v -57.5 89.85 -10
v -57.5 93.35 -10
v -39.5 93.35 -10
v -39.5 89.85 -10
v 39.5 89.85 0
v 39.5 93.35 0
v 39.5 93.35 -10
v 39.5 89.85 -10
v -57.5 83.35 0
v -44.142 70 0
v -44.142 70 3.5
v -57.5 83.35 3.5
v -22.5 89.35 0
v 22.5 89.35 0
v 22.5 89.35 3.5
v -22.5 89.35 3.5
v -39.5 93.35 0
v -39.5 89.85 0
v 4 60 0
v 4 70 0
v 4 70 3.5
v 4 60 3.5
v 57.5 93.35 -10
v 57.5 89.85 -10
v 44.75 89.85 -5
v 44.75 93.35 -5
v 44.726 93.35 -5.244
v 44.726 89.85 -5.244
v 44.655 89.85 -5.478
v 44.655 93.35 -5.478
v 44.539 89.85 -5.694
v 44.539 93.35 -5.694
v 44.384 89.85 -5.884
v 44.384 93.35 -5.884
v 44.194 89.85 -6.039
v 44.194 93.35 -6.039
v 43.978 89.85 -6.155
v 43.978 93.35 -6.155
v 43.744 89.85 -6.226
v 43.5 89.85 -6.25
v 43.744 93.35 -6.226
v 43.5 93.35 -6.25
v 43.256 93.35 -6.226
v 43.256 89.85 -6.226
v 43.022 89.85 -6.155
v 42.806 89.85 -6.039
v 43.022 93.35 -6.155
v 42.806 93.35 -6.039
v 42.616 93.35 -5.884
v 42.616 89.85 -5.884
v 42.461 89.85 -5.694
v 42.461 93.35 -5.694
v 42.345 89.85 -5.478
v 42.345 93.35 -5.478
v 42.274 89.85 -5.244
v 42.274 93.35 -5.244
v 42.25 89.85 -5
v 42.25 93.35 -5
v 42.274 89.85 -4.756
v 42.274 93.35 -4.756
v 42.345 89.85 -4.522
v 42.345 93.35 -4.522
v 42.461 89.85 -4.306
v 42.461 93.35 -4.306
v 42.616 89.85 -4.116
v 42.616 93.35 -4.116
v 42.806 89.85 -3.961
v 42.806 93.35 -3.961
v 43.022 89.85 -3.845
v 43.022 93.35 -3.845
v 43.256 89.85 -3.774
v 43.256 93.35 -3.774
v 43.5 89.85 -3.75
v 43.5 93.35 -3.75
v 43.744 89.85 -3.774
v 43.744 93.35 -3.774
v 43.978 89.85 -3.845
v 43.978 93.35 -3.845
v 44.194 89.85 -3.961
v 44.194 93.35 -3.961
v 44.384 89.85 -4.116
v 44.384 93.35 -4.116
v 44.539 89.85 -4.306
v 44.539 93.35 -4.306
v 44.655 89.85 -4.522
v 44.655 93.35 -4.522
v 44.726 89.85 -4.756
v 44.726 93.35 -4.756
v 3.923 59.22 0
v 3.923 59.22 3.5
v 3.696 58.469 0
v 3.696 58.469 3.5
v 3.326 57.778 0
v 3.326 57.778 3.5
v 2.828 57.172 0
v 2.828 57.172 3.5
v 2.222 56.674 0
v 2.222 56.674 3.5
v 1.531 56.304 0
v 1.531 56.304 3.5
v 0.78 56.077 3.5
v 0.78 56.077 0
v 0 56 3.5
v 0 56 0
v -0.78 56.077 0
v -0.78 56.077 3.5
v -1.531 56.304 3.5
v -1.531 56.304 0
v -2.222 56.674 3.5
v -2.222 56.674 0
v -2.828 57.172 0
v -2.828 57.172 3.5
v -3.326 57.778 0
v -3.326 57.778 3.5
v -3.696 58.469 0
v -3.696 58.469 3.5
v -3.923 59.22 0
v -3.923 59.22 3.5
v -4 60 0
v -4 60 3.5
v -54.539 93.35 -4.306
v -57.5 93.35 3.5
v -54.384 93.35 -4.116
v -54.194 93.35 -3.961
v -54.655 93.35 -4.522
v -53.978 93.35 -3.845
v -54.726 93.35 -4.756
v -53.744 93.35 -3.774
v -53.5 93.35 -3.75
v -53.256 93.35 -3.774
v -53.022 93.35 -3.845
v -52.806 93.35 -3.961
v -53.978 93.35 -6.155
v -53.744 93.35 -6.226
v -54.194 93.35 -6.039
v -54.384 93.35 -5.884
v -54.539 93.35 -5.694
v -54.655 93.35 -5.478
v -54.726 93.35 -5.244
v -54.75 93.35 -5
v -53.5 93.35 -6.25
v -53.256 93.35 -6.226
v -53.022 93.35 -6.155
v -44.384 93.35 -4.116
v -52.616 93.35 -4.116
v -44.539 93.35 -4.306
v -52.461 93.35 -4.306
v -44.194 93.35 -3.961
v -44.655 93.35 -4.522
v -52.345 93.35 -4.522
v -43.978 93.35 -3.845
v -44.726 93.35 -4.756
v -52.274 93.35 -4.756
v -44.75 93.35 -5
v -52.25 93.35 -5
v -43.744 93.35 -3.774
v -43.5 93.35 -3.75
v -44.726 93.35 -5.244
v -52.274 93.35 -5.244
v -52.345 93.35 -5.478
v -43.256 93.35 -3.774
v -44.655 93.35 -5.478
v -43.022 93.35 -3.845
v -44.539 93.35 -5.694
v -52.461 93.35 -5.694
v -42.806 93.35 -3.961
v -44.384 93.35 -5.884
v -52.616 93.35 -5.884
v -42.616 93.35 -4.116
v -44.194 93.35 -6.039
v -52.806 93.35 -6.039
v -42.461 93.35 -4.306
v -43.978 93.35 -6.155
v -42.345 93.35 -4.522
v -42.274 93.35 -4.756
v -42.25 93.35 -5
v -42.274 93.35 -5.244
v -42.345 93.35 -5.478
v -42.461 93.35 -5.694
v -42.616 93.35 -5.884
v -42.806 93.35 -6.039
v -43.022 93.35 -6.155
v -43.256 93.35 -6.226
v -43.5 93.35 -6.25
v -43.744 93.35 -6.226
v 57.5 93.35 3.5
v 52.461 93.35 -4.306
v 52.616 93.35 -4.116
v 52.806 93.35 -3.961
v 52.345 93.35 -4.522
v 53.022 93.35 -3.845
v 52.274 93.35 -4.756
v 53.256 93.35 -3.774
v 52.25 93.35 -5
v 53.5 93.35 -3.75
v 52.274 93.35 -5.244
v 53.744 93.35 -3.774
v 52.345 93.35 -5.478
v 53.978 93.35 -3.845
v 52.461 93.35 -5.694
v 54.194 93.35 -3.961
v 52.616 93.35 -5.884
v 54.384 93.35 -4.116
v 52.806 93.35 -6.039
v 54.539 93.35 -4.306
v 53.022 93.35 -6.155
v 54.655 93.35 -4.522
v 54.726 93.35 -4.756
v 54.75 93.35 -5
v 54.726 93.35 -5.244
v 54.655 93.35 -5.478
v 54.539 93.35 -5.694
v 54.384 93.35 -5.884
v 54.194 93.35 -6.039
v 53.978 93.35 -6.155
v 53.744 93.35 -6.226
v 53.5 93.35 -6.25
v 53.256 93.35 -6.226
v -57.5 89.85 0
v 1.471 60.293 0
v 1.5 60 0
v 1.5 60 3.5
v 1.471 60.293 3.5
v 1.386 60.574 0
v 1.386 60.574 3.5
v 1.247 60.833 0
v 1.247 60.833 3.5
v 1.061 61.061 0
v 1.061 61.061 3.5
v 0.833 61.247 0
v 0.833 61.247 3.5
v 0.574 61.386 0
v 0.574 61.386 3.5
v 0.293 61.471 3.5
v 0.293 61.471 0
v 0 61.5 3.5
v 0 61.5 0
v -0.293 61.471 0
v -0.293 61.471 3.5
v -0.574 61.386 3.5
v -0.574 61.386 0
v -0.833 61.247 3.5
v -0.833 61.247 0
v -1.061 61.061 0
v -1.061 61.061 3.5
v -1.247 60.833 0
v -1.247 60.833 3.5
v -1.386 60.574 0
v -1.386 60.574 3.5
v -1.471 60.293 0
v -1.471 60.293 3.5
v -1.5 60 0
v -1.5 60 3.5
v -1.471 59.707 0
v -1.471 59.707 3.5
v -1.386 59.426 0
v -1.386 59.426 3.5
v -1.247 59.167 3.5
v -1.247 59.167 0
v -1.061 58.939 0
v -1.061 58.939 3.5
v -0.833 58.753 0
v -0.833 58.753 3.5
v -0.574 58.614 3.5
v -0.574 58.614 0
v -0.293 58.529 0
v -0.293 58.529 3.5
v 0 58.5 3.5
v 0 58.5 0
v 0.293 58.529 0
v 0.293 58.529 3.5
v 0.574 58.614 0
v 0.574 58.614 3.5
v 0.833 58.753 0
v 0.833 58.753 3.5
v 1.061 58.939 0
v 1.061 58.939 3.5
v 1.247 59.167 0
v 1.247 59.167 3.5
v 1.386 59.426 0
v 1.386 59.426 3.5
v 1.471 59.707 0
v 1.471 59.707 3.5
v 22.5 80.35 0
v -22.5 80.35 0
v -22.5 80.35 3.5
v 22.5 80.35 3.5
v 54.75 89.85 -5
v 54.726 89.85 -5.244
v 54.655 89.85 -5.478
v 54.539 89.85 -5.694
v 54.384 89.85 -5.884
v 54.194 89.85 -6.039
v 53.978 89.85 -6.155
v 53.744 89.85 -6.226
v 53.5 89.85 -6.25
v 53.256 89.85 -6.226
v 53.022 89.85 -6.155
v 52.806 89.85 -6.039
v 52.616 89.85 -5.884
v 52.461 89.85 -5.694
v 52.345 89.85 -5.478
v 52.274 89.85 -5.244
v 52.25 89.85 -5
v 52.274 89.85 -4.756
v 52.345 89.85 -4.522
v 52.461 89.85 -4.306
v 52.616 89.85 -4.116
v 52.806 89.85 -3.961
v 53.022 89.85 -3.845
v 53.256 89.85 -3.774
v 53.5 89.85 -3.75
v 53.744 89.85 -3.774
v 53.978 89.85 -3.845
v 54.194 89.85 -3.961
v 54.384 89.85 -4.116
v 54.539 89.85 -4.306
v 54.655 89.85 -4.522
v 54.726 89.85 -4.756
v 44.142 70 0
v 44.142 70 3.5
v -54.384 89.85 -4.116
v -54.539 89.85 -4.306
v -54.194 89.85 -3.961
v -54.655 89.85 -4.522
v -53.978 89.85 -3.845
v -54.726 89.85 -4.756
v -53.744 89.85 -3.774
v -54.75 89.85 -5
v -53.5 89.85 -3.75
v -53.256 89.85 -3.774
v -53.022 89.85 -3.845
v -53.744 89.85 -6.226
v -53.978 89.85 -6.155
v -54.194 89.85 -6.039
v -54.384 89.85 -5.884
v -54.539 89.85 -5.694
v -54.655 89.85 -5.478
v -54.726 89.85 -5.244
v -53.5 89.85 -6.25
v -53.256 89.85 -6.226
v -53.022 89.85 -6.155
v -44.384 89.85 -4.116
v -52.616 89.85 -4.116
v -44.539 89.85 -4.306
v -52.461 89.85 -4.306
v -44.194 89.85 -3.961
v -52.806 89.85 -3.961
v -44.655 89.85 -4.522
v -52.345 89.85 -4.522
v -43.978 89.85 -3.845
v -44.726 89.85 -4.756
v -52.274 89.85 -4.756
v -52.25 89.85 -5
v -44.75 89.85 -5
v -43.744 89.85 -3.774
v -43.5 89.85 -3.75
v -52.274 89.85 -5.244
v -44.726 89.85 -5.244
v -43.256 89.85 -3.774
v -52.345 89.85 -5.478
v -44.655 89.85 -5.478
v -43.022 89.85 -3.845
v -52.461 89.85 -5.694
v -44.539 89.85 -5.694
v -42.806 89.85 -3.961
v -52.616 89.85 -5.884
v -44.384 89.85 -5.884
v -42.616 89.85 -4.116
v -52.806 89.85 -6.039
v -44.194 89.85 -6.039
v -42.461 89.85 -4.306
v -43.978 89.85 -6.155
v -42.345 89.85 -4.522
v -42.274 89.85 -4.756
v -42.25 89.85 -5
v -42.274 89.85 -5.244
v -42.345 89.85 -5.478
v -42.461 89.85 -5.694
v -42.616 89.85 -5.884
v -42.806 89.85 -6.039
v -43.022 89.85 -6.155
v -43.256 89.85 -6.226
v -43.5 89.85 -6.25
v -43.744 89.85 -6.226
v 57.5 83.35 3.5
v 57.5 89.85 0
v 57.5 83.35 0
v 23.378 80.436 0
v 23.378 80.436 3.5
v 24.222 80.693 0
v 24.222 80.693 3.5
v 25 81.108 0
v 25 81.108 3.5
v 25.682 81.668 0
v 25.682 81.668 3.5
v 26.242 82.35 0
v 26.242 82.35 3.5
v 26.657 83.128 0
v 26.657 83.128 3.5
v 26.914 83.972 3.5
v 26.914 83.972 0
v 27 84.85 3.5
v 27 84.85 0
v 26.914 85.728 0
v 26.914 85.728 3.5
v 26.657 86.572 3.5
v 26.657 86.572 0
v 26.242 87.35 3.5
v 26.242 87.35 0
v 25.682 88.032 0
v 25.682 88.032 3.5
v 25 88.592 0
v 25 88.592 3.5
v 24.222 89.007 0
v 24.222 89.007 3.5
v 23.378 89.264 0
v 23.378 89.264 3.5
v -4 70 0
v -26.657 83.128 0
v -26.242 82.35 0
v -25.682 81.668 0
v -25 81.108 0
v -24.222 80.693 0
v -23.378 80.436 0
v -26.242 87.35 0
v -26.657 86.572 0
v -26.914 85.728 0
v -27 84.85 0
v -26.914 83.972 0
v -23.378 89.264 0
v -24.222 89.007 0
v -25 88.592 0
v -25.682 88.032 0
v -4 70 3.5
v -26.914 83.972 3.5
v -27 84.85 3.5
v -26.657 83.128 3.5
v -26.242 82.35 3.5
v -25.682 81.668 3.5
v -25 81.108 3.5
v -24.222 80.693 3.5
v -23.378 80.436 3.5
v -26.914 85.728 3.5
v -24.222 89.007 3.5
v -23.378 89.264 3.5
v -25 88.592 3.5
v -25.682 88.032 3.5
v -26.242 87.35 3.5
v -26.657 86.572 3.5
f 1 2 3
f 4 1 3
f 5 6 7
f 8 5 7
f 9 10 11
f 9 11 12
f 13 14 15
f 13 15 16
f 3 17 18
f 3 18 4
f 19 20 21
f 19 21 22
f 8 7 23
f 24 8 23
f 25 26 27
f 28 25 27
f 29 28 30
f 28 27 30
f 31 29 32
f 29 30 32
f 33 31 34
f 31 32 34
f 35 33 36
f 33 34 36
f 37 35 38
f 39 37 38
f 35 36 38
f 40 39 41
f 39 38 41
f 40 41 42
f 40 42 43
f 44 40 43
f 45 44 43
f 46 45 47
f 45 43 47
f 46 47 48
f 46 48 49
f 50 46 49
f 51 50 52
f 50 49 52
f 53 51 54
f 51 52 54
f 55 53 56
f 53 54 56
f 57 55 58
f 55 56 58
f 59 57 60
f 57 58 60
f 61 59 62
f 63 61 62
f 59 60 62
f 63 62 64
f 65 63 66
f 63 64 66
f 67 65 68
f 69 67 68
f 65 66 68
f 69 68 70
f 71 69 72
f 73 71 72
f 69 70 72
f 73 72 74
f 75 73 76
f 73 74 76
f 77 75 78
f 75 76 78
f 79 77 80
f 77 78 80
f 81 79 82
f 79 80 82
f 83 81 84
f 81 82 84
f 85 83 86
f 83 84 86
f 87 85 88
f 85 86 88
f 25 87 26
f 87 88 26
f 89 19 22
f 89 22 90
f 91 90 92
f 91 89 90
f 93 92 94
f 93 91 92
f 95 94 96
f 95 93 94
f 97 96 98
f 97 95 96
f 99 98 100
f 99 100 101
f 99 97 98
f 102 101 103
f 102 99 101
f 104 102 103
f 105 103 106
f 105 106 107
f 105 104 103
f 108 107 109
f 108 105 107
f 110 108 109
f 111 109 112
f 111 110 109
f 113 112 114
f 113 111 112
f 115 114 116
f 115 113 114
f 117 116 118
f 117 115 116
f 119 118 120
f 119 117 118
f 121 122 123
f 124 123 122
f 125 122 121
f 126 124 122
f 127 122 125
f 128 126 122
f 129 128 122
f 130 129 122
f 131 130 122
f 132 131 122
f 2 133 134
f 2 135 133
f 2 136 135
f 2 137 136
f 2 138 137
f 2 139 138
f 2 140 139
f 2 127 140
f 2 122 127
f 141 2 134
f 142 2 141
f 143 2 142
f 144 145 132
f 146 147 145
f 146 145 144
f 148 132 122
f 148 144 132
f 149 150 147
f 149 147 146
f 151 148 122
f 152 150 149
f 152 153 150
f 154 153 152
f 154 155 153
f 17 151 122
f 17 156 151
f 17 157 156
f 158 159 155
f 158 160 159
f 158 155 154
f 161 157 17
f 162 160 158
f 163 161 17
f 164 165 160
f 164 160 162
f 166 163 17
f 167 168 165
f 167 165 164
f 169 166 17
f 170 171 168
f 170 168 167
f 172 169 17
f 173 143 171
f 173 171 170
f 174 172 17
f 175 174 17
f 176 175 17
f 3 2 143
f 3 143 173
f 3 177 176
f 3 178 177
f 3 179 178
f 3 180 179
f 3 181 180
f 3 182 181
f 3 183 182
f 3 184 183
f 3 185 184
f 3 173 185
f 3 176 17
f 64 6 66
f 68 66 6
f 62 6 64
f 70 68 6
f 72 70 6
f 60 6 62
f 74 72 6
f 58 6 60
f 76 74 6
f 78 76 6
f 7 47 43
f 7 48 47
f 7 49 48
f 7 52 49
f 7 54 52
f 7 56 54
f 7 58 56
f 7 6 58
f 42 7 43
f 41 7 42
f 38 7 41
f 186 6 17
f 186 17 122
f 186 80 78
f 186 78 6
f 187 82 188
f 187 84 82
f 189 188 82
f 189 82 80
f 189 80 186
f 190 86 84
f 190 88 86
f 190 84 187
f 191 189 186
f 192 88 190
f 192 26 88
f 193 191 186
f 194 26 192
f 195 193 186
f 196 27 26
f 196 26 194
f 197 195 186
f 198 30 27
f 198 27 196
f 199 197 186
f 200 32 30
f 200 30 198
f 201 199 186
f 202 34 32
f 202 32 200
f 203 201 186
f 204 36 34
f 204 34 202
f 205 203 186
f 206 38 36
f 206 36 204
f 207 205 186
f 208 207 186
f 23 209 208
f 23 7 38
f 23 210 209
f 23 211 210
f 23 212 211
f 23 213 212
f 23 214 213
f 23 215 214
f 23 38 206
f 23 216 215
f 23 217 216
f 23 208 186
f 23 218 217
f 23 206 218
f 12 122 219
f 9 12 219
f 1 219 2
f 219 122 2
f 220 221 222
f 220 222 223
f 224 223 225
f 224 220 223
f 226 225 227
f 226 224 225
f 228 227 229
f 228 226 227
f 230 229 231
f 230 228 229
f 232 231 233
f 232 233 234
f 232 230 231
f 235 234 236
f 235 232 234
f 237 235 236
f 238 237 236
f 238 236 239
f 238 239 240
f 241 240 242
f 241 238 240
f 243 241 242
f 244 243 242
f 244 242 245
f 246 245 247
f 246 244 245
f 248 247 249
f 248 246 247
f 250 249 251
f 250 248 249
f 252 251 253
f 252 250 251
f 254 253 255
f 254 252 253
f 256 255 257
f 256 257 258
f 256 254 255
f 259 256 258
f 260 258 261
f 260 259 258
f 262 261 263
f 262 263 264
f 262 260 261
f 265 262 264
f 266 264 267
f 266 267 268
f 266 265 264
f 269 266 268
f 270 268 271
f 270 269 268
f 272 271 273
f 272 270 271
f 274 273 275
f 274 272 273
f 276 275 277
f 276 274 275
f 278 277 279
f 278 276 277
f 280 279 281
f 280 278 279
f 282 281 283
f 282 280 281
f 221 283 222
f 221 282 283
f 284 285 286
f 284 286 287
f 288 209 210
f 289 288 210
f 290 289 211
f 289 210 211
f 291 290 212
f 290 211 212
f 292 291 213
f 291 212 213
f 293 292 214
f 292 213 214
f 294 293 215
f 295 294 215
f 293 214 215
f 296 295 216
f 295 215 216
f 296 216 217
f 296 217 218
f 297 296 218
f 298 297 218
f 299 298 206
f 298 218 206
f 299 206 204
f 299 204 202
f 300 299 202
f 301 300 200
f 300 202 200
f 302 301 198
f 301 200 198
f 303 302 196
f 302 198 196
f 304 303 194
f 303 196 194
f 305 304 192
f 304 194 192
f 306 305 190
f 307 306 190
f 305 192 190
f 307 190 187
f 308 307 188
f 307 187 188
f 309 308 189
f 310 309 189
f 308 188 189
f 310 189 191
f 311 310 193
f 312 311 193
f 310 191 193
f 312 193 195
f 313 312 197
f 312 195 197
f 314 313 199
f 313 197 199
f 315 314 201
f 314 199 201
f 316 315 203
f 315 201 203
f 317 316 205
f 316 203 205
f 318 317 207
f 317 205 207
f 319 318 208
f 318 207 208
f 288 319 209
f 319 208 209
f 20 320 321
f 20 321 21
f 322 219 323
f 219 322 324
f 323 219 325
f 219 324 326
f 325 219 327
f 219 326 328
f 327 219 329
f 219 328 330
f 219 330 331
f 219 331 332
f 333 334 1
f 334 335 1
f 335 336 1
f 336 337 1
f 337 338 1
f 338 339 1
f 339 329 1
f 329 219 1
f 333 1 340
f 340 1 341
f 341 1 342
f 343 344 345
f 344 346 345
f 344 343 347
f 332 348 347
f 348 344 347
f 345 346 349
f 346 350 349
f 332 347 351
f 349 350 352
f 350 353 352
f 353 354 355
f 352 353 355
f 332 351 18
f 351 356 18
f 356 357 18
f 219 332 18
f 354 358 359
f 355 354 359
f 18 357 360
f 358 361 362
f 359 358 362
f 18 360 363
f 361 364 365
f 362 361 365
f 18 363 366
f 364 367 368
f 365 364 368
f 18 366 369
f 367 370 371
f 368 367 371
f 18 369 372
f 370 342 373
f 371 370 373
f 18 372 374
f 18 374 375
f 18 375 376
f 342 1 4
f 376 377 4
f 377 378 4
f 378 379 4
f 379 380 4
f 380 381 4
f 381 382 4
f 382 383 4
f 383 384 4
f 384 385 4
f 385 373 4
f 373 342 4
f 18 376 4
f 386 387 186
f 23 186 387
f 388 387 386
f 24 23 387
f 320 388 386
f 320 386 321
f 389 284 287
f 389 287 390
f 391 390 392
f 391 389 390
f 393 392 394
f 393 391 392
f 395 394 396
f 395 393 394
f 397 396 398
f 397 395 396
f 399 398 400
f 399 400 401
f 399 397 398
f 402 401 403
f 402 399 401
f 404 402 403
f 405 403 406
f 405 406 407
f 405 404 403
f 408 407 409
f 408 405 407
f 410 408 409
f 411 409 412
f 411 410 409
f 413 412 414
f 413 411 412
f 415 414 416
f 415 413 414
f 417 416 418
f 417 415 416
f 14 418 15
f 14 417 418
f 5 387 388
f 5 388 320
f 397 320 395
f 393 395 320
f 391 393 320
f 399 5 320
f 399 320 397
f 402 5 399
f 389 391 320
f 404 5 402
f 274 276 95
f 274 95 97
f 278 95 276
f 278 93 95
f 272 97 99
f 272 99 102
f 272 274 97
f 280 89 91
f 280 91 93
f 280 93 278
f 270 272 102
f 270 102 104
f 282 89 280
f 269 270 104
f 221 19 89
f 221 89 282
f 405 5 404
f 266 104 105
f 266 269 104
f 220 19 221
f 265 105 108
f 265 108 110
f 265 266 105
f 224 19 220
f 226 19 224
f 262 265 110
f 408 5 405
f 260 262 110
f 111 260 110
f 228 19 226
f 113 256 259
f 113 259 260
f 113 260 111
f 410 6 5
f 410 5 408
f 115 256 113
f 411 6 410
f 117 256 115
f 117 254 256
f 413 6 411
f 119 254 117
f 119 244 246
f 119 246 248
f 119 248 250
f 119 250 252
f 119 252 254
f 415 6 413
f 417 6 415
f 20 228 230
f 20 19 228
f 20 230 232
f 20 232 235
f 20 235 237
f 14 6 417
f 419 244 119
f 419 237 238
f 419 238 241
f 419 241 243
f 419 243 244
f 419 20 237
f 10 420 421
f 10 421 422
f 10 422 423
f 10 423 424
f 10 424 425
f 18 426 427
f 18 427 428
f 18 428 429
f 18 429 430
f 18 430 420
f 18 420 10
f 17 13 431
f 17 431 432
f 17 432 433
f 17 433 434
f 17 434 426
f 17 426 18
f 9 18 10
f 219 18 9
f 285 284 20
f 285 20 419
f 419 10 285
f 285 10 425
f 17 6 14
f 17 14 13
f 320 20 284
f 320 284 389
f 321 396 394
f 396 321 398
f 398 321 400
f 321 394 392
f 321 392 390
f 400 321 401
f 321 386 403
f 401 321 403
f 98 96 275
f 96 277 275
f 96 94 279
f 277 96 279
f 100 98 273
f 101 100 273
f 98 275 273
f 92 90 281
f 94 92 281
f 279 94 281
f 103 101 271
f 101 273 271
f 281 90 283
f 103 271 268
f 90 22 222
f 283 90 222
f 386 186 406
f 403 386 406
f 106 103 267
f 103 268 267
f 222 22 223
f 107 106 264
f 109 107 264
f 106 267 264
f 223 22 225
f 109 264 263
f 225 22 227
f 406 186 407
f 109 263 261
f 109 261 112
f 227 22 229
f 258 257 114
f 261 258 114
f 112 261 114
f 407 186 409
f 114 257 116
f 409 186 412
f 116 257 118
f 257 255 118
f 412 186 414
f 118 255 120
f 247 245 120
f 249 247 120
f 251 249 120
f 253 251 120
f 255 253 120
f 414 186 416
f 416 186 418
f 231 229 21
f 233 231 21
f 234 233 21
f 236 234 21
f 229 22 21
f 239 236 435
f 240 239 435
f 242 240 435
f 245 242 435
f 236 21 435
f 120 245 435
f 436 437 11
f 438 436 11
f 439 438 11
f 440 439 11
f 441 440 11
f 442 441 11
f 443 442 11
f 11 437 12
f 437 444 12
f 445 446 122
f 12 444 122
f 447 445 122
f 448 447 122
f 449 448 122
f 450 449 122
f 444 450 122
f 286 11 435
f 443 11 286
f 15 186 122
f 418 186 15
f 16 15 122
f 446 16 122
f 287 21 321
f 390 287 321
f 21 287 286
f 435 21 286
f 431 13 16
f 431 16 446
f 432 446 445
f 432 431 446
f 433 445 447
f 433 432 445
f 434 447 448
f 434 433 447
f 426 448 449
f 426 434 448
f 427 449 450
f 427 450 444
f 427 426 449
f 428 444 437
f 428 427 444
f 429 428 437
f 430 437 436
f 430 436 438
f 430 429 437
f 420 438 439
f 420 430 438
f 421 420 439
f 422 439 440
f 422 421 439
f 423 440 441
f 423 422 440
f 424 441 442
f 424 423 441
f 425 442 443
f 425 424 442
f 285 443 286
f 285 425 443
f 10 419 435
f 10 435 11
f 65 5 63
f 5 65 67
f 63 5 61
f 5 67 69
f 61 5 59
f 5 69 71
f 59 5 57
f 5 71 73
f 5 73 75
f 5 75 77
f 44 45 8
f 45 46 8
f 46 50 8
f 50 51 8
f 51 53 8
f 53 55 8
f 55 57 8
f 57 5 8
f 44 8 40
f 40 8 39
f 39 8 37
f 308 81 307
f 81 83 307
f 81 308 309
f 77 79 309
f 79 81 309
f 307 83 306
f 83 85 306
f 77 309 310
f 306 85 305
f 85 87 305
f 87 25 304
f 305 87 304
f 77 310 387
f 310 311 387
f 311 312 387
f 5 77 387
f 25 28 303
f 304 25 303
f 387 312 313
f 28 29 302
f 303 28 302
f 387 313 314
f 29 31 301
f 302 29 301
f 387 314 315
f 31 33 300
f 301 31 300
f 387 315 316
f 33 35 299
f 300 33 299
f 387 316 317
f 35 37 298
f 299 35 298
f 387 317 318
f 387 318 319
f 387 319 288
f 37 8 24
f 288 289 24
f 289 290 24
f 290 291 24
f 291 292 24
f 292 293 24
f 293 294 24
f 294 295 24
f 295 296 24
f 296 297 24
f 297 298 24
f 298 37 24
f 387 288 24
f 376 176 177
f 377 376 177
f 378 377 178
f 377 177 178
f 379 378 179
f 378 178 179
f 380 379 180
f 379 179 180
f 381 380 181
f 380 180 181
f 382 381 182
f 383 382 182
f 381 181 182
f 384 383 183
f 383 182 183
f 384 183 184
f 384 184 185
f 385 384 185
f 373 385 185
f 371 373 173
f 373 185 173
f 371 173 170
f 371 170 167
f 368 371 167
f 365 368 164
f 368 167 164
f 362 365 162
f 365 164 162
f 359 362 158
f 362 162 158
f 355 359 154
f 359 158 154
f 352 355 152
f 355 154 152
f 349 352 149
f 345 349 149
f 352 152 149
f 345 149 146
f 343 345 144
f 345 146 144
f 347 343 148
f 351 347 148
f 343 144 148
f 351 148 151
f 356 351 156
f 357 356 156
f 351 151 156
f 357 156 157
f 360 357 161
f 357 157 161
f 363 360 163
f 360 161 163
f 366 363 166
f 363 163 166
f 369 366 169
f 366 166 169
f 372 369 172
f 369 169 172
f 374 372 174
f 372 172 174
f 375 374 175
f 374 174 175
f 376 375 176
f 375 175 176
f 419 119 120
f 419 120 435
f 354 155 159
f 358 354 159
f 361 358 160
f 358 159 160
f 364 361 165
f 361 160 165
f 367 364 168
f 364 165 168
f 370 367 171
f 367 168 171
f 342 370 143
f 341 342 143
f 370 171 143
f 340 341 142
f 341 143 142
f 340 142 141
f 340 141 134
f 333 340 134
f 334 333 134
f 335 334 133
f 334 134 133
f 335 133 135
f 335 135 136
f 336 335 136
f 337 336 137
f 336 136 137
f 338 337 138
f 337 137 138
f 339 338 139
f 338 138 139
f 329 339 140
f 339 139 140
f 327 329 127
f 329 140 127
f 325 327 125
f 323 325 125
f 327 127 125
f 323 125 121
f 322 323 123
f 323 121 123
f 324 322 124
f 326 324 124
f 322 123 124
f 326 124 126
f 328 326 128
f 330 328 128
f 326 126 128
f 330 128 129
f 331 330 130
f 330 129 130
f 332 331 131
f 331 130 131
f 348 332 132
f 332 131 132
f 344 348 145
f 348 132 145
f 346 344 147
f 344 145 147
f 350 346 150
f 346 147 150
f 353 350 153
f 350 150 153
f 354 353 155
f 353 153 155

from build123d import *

# Parameters (mm, degrees)
SKETCH7_R           = 1.5
BOSS_EXTRUDE1_DEPTH = 3.5
SKETCH10_W          = 18
SKETCH10_H          = 10
SKETCH10_R          = 1.25
BOSS_EXTRUDE3_DEPTH = 3.5


with BuildPart() as part:
    # Sketch7 → Boss-Extrude1 (new body)
    with BuildSketch(Plane.XY):
        with BuildLine():
            Line((-4, 60), (-4, 70))
            Line((-4, 70), (-44.142135624, 70))
            Line((-44.142135624, 70), (-57.5, 83.35))
            Line((-57.5, 83.35), (-57.5, 93.35))
            Line((-57.5, 93.35), (57.5, 93.35))
            Line((57.5, 93.35), (57.5, 83.35))
            Line((57.5, 83.35), (44.142135624, 70))
            Line((44.142135624, 70), (4, 70))
            Line((4, 70), (4, 60))
            ThreePointArc((4, 60), (0, 56), (-4, 60))
        make_face()
        with Locations((0, 60)):
            Circle(SKETCH7_R, mode=Mode.SUBTRACT)
        with BuildLine():
            Line((22.5, 89.35), (-22.5, 89.35))
            ThreePointArc((-22.5, 89.35), (-27, 84.85), (-22.5, 80.35))
            Line((-22.5, 80.35), (22.5, 80.35))
            ThreePointArc((22.5, 80.35), (27, 84.85), (22.5, 89.35))
        make_face(mode=Mode.SUBTRACT)
    extrude(amount=BOSS_EXTRUDE1_DEPTH)

    # Sketch10 → Boss-Extrude3 (add)
    with BuildSketch(Plane(origin=(0, 93.35, 0), x_dir=(1, 0, 0), z_dir=(0, 1, 0))):
        with Locations((-48.5, 5)):
            Rectangle(SKETCH10_W, SKETCH10_H)
        with Locations((-53.5, 5)):
            Circle(SKETCH10_R, mode=Mode.SUBTRACT)
        with Locations((-43.5, 5)):
            Circle(SKETCH10_R, mode=Mode.SUBTRACT)
        with Locations((48.5, 5)):
            Rectangle(SKETCH10_W, SKETCH10_H)
        with Locations((43.5, 5)):
            Circle(SKETCH10_R, mode=Mode.SUBTRACT)
        with Locations((53.5, 5)):
            Circle(SKETCH10_R, mode=Mode.SUBTRACT)
    extrude(amount=-BOSS_EXTRUDE3_DEPTH)


solid = part.part
